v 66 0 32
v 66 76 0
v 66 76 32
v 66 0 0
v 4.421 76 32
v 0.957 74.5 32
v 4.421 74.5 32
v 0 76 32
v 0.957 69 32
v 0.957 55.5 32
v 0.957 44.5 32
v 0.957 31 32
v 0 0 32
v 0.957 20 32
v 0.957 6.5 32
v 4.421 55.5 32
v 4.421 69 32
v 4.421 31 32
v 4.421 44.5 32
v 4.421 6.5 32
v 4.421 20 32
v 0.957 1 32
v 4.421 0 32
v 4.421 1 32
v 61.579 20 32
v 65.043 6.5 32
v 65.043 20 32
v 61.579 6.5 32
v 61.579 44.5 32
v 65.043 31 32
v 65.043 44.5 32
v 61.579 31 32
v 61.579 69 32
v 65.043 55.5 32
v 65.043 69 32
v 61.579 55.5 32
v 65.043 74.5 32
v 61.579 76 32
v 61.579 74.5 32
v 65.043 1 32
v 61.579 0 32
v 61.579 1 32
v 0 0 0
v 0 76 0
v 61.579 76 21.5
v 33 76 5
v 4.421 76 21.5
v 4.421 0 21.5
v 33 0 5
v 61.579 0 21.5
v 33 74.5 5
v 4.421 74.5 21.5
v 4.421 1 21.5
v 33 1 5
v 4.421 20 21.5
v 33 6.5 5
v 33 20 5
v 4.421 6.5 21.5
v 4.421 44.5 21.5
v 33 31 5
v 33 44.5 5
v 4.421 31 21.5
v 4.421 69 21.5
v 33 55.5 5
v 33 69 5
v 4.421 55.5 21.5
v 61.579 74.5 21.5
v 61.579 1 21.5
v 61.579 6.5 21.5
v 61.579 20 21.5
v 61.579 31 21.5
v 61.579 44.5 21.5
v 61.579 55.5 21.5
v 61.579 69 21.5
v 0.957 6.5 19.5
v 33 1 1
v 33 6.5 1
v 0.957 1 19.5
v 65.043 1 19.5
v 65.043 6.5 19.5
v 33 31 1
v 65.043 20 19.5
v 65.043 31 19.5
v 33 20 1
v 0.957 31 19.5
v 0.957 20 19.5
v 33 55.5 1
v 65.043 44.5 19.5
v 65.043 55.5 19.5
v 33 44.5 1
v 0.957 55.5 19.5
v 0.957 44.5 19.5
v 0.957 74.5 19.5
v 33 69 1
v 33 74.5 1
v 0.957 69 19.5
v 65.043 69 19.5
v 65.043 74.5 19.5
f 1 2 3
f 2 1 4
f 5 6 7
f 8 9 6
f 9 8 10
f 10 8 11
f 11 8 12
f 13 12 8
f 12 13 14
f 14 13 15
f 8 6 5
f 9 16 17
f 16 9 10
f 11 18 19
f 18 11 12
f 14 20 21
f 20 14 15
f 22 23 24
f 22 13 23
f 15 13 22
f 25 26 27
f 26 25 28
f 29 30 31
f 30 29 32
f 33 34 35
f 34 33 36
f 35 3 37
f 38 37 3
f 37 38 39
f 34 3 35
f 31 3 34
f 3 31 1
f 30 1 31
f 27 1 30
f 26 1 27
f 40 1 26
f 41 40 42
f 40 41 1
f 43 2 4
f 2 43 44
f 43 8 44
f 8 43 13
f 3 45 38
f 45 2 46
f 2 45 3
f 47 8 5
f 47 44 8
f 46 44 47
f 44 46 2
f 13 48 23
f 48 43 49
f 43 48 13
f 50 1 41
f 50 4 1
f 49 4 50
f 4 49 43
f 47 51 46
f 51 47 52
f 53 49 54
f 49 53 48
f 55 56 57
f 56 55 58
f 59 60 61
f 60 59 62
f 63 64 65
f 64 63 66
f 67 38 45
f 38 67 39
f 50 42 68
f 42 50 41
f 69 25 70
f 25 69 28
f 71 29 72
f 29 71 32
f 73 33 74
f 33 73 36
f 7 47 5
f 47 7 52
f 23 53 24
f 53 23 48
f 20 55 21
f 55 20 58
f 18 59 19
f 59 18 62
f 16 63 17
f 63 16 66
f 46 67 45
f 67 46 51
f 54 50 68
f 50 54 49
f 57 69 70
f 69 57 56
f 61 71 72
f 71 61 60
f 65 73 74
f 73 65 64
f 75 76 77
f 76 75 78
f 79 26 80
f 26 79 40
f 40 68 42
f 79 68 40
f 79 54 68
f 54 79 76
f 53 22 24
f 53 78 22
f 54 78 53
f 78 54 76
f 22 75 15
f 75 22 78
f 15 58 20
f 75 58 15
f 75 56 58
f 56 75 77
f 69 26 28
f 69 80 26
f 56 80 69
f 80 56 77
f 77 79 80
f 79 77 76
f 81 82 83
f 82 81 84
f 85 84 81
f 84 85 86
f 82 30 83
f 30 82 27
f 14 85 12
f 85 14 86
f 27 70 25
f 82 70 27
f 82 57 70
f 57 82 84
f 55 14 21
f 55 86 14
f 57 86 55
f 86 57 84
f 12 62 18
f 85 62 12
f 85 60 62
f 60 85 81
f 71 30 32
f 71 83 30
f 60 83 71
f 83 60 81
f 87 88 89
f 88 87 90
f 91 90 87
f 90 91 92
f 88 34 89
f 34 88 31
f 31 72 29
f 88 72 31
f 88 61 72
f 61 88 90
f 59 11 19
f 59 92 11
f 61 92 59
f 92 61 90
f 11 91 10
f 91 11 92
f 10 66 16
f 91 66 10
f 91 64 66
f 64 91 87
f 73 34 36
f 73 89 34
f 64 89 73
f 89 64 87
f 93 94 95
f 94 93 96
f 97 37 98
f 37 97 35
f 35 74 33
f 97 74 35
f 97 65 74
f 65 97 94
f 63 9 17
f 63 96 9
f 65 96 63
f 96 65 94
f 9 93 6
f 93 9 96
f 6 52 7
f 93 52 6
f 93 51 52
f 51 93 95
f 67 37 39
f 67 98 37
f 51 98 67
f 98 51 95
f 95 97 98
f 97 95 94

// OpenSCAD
$fn=200;
THICK = 1;

TILE_L = 19;
TILE_COUNT = 6;

BOX_W = 64;
BOX_L = 17 + (TILE_L * 3);
BOX_H = 32;

difference() {
    cube(size = [
        BOX_W + (THICK * 2),
        BOX_L + (THICK * 2), 
        BOX_H]);

    translate([33, -5, 38])
        rotate([0, 90, 90]) 
            cylinder(h = 200, r = 33, $fn=6);

    // for (i = [THICK : TILE_L + 1 : THICK + ((TILE_L + 1) * (TILE_COUNT - 1))] ) {
    //     tile_slot(i);
    // }

    tile_slot(1);
    tile_slot(1 + TILE_L);

    tile_slot(6.5 + TILE_L);
    tile_slot(6.5 + (TILE_L * 2));

    tile_slot(12 + (TILE_L * 2));
    tile_slot(12 + (TILE_L * 3));
}

module tile_slot(y) {
    translate([33, y, 38])
        rotate([0, 90, 90]) 
            cylinder(h = 5.5, r = 37, $fn=6);
}
